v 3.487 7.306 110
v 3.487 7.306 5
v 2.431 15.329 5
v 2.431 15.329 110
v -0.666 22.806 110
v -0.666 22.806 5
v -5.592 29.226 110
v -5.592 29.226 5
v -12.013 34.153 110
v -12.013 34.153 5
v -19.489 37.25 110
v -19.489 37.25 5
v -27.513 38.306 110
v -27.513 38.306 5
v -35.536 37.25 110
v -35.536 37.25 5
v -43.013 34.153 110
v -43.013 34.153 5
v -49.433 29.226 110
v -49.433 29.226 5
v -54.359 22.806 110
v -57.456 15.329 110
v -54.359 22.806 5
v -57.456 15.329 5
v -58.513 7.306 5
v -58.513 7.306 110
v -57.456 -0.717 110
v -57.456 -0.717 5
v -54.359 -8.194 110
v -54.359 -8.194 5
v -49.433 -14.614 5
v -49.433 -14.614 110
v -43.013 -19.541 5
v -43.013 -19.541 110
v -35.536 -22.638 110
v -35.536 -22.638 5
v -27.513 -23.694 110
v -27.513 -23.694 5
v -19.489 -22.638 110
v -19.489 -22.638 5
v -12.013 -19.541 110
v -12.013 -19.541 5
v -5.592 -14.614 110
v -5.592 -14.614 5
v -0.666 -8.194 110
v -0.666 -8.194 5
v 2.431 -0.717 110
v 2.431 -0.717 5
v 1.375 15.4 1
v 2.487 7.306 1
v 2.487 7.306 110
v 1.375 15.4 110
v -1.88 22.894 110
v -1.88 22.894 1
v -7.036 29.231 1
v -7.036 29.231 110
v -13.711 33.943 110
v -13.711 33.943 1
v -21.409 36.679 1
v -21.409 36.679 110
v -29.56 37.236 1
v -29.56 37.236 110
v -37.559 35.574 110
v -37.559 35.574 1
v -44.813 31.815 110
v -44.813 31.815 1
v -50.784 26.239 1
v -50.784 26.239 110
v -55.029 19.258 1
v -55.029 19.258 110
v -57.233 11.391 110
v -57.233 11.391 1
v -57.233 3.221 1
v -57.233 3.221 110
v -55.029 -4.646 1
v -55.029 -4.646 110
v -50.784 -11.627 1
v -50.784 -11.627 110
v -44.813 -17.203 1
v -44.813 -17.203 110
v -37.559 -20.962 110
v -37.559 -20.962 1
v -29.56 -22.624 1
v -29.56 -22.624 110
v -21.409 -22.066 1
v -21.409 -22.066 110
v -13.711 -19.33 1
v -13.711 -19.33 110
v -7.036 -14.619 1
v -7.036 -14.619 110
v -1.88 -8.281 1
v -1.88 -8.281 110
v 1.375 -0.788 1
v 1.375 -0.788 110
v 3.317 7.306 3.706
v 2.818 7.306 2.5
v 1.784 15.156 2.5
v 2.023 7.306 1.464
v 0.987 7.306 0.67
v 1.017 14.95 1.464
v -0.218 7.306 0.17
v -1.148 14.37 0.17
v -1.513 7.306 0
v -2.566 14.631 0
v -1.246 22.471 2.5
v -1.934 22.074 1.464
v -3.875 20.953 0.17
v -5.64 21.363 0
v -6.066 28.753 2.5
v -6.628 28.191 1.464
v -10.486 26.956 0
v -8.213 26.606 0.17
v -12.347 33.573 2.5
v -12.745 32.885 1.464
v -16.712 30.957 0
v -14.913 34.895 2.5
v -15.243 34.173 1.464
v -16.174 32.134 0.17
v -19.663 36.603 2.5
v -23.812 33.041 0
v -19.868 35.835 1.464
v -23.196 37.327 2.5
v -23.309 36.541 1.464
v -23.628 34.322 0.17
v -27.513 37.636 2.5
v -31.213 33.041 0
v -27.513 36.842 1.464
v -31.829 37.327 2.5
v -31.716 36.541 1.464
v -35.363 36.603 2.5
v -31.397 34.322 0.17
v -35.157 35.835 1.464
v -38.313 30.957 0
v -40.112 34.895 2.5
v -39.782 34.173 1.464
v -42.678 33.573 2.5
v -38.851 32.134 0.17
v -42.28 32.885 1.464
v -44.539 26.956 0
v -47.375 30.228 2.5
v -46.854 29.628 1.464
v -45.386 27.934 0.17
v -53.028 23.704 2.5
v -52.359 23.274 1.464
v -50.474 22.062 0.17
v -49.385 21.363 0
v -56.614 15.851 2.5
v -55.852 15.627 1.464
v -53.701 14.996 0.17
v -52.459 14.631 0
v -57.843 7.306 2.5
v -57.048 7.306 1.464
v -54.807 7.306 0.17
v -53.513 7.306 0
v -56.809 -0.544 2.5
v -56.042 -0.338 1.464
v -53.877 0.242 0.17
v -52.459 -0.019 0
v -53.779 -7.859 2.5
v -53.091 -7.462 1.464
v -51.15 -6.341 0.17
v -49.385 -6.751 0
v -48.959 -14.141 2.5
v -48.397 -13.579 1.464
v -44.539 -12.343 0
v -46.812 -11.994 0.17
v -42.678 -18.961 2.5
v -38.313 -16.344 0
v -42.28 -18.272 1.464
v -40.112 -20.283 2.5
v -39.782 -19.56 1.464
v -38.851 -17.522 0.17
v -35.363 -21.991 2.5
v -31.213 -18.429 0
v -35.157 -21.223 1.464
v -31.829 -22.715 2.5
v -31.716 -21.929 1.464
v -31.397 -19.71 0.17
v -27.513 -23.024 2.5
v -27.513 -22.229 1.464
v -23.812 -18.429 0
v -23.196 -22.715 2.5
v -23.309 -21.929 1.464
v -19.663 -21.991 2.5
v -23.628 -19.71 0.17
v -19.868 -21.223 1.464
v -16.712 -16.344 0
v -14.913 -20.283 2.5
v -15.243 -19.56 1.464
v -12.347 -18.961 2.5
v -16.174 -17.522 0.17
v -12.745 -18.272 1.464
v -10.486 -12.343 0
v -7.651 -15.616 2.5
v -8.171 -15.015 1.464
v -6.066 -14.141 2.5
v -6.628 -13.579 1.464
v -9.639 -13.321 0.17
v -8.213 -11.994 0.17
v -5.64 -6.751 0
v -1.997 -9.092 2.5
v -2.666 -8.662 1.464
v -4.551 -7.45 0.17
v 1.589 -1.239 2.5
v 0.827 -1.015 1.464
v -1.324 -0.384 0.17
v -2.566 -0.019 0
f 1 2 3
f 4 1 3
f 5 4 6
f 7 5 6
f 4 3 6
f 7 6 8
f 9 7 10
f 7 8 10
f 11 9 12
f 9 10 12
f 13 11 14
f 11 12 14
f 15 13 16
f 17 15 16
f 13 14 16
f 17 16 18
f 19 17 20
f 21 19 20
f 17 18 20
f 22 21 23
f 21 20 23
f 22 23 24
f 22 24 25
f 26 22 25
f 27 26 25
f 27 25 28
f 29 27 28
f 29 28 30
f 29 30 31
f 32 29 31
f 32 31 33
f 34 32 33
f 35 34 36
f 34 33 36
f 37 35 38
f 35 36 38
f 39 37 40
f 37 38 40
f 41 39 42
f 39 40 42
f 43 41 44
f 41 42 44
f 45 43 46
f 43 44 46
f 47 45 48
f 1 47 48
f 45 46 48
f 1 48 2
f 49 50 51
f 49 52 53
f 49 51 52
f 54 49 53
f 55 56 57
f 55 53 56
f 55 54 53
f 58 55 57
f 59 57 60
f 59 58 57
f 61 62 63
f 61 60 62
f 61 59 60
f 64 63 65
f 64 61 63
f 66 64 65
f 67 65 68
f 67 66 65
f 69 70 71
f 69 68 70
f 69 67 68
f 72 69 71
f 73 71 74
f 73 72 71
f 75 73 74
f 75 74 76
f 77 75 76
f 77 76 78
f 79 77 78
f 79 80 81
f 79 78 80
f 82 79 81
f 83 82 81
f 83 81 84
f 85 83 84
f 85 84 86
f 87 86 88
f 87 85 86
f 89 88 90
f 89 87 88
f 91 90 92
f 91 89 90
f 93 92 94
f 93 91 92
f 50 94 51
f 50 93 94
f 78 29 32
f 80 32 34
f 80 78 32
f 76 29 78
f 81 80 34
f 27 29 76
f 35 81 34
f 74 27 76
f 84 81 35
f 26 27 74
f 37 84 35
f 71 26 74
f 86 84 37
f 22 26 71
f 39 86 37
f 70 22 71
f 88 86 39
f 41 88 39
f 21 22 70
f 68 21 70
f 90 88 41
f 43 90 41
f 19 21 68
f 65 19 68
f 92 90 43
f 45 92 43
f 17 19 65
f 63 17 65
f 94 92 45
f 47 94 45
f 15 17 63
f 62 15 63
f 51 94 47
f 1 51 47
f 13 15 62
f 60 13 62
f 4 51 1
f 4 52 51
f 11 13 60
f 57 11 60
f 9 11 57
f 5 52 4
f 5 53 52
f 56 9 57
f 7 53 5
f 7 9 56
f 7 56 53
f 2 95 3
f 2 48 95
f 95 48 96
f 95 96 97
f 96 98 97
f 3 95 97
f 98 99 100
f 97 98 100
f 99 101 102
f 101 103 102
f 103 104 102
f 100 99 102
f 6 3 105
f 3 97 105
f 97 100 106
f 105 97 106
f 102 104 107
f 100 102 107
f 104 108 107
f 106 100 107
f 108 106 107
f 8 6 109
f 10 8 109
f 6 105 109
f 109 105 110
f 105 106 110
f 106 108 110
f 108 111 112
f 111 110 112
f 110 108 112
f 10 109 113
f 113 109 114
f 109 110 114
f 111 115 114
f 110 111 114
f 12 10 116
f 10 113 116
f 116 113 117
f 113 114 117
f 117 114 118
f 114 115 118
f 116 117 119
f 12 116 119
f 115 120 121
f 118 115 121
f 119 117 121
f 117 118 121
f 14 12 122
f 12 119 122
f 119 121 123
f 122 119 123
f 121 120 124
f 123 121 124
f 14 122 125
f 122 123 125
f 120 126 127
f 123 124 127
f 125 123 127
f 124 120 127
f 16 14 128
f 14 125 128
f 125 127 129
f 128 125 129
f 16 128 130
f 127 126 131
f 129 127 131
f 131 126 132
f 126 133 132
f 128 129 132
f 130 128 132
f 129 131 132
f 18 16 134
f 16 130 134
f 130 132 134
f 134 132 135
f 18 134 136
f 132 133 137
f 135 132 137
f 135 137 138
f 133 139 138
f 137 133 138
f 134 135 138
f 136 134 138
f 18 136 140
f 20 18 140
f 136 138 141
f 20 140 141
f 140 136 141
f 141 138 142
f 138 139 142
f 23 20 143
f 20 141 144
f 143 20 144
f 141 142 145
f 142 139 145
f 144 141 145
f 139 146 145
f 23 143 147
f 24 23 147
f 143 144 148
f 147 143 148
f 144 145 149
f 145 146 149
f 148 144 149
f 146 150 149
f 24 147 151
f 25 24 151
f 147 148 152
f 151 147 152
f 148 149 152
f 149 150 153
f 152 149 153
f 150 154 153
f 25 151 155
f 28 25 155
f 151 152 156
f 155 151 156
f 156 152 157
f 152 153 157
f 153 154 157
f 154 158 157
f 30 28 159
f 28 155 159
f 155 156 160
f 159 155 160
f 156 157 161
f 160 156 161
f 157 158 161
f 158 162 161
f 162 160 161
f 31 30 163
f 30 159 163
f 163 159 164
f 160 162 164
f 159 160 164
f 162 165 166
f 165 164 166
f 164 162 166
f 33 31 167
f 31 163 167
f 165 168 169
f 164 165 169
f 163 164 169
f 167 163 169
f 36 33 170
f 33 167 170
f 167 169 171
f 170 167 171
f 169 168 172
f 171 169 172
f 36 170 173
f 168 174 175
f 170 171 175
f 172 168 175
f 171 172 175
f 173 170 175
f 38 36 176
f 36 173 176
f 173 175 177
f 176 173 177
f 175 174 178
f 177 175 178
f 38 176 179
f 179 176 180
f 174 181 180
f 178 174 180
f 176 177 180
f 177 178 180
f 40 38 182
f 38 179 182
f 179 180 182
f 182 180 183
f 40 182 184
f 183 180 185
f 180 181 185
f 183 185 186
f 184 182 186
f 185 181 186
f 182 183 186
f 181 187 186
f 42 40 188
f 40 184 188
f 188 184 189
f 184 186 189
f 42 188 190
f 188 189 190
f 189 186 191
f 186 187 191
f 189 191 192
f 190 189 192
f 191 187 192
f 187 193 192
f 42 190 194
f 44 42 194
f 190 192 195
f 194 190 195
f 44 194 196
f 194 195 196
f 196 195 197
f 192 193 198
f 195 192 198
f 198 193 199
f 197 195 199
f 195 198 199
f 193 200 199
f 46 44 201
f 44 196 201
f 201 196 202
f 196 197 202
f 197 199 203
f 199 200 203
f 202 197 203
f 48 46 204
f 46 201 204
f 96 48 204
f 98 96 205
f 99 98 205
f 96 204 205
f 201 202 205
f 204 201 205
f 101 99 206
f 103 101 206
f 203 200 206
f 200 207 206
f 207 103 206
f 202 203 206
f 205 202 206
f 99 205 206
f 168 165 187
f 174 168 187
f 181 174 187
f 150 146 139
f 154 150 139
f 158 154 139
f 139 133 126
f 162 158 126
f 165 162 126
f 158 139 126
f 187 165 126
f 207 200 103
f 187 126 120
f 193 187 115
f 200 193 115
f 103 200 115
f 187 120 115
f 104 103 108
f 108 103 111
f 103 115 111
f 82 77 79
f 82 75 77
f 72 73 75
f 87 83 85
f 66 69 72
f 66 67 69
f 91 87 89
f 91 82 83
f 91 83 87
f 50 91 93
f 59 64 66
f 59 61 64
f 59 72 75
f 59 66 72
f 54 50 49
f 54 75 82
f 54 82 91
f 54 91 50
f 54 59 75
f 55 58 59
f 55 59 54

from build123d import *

# Parameters (mm, degrees)
SKETCH1_R           = 31
BOSS_EXTRUDE1_DEPTH = 110
SHELL1_T            = -1
FILLET2_R           = 5


with BuildPart() as part:
    # Sketch1 → Boss-Extrude1 (new body)
    with BuildSketch(Plane.XY):
        with Locations((-27.512537488, 7.30607002)):
            Circle(SKETCH1_R)
    extrude(amount=BOSS_EXTRUDE1_DEPTH)

    # Shell1
    shell1_openings = [part.faces().sort_by_distance(p)[0] for p in [
        (3.487462512, 7.30607002, 110),
    ]]
    offset(amount=SHELL1_T, openings=shell1_openings, kind=Kind.INTERSECTION)

    # Fillet2
    fillet2_edges = [part.edges().sort_by_distance(p)[0] for p in [
        (-58.512537488, 7.30607002, 0),
    ]]
    fillet(fillet2_edges, radius=FILLET2_R)


solid = part.part
